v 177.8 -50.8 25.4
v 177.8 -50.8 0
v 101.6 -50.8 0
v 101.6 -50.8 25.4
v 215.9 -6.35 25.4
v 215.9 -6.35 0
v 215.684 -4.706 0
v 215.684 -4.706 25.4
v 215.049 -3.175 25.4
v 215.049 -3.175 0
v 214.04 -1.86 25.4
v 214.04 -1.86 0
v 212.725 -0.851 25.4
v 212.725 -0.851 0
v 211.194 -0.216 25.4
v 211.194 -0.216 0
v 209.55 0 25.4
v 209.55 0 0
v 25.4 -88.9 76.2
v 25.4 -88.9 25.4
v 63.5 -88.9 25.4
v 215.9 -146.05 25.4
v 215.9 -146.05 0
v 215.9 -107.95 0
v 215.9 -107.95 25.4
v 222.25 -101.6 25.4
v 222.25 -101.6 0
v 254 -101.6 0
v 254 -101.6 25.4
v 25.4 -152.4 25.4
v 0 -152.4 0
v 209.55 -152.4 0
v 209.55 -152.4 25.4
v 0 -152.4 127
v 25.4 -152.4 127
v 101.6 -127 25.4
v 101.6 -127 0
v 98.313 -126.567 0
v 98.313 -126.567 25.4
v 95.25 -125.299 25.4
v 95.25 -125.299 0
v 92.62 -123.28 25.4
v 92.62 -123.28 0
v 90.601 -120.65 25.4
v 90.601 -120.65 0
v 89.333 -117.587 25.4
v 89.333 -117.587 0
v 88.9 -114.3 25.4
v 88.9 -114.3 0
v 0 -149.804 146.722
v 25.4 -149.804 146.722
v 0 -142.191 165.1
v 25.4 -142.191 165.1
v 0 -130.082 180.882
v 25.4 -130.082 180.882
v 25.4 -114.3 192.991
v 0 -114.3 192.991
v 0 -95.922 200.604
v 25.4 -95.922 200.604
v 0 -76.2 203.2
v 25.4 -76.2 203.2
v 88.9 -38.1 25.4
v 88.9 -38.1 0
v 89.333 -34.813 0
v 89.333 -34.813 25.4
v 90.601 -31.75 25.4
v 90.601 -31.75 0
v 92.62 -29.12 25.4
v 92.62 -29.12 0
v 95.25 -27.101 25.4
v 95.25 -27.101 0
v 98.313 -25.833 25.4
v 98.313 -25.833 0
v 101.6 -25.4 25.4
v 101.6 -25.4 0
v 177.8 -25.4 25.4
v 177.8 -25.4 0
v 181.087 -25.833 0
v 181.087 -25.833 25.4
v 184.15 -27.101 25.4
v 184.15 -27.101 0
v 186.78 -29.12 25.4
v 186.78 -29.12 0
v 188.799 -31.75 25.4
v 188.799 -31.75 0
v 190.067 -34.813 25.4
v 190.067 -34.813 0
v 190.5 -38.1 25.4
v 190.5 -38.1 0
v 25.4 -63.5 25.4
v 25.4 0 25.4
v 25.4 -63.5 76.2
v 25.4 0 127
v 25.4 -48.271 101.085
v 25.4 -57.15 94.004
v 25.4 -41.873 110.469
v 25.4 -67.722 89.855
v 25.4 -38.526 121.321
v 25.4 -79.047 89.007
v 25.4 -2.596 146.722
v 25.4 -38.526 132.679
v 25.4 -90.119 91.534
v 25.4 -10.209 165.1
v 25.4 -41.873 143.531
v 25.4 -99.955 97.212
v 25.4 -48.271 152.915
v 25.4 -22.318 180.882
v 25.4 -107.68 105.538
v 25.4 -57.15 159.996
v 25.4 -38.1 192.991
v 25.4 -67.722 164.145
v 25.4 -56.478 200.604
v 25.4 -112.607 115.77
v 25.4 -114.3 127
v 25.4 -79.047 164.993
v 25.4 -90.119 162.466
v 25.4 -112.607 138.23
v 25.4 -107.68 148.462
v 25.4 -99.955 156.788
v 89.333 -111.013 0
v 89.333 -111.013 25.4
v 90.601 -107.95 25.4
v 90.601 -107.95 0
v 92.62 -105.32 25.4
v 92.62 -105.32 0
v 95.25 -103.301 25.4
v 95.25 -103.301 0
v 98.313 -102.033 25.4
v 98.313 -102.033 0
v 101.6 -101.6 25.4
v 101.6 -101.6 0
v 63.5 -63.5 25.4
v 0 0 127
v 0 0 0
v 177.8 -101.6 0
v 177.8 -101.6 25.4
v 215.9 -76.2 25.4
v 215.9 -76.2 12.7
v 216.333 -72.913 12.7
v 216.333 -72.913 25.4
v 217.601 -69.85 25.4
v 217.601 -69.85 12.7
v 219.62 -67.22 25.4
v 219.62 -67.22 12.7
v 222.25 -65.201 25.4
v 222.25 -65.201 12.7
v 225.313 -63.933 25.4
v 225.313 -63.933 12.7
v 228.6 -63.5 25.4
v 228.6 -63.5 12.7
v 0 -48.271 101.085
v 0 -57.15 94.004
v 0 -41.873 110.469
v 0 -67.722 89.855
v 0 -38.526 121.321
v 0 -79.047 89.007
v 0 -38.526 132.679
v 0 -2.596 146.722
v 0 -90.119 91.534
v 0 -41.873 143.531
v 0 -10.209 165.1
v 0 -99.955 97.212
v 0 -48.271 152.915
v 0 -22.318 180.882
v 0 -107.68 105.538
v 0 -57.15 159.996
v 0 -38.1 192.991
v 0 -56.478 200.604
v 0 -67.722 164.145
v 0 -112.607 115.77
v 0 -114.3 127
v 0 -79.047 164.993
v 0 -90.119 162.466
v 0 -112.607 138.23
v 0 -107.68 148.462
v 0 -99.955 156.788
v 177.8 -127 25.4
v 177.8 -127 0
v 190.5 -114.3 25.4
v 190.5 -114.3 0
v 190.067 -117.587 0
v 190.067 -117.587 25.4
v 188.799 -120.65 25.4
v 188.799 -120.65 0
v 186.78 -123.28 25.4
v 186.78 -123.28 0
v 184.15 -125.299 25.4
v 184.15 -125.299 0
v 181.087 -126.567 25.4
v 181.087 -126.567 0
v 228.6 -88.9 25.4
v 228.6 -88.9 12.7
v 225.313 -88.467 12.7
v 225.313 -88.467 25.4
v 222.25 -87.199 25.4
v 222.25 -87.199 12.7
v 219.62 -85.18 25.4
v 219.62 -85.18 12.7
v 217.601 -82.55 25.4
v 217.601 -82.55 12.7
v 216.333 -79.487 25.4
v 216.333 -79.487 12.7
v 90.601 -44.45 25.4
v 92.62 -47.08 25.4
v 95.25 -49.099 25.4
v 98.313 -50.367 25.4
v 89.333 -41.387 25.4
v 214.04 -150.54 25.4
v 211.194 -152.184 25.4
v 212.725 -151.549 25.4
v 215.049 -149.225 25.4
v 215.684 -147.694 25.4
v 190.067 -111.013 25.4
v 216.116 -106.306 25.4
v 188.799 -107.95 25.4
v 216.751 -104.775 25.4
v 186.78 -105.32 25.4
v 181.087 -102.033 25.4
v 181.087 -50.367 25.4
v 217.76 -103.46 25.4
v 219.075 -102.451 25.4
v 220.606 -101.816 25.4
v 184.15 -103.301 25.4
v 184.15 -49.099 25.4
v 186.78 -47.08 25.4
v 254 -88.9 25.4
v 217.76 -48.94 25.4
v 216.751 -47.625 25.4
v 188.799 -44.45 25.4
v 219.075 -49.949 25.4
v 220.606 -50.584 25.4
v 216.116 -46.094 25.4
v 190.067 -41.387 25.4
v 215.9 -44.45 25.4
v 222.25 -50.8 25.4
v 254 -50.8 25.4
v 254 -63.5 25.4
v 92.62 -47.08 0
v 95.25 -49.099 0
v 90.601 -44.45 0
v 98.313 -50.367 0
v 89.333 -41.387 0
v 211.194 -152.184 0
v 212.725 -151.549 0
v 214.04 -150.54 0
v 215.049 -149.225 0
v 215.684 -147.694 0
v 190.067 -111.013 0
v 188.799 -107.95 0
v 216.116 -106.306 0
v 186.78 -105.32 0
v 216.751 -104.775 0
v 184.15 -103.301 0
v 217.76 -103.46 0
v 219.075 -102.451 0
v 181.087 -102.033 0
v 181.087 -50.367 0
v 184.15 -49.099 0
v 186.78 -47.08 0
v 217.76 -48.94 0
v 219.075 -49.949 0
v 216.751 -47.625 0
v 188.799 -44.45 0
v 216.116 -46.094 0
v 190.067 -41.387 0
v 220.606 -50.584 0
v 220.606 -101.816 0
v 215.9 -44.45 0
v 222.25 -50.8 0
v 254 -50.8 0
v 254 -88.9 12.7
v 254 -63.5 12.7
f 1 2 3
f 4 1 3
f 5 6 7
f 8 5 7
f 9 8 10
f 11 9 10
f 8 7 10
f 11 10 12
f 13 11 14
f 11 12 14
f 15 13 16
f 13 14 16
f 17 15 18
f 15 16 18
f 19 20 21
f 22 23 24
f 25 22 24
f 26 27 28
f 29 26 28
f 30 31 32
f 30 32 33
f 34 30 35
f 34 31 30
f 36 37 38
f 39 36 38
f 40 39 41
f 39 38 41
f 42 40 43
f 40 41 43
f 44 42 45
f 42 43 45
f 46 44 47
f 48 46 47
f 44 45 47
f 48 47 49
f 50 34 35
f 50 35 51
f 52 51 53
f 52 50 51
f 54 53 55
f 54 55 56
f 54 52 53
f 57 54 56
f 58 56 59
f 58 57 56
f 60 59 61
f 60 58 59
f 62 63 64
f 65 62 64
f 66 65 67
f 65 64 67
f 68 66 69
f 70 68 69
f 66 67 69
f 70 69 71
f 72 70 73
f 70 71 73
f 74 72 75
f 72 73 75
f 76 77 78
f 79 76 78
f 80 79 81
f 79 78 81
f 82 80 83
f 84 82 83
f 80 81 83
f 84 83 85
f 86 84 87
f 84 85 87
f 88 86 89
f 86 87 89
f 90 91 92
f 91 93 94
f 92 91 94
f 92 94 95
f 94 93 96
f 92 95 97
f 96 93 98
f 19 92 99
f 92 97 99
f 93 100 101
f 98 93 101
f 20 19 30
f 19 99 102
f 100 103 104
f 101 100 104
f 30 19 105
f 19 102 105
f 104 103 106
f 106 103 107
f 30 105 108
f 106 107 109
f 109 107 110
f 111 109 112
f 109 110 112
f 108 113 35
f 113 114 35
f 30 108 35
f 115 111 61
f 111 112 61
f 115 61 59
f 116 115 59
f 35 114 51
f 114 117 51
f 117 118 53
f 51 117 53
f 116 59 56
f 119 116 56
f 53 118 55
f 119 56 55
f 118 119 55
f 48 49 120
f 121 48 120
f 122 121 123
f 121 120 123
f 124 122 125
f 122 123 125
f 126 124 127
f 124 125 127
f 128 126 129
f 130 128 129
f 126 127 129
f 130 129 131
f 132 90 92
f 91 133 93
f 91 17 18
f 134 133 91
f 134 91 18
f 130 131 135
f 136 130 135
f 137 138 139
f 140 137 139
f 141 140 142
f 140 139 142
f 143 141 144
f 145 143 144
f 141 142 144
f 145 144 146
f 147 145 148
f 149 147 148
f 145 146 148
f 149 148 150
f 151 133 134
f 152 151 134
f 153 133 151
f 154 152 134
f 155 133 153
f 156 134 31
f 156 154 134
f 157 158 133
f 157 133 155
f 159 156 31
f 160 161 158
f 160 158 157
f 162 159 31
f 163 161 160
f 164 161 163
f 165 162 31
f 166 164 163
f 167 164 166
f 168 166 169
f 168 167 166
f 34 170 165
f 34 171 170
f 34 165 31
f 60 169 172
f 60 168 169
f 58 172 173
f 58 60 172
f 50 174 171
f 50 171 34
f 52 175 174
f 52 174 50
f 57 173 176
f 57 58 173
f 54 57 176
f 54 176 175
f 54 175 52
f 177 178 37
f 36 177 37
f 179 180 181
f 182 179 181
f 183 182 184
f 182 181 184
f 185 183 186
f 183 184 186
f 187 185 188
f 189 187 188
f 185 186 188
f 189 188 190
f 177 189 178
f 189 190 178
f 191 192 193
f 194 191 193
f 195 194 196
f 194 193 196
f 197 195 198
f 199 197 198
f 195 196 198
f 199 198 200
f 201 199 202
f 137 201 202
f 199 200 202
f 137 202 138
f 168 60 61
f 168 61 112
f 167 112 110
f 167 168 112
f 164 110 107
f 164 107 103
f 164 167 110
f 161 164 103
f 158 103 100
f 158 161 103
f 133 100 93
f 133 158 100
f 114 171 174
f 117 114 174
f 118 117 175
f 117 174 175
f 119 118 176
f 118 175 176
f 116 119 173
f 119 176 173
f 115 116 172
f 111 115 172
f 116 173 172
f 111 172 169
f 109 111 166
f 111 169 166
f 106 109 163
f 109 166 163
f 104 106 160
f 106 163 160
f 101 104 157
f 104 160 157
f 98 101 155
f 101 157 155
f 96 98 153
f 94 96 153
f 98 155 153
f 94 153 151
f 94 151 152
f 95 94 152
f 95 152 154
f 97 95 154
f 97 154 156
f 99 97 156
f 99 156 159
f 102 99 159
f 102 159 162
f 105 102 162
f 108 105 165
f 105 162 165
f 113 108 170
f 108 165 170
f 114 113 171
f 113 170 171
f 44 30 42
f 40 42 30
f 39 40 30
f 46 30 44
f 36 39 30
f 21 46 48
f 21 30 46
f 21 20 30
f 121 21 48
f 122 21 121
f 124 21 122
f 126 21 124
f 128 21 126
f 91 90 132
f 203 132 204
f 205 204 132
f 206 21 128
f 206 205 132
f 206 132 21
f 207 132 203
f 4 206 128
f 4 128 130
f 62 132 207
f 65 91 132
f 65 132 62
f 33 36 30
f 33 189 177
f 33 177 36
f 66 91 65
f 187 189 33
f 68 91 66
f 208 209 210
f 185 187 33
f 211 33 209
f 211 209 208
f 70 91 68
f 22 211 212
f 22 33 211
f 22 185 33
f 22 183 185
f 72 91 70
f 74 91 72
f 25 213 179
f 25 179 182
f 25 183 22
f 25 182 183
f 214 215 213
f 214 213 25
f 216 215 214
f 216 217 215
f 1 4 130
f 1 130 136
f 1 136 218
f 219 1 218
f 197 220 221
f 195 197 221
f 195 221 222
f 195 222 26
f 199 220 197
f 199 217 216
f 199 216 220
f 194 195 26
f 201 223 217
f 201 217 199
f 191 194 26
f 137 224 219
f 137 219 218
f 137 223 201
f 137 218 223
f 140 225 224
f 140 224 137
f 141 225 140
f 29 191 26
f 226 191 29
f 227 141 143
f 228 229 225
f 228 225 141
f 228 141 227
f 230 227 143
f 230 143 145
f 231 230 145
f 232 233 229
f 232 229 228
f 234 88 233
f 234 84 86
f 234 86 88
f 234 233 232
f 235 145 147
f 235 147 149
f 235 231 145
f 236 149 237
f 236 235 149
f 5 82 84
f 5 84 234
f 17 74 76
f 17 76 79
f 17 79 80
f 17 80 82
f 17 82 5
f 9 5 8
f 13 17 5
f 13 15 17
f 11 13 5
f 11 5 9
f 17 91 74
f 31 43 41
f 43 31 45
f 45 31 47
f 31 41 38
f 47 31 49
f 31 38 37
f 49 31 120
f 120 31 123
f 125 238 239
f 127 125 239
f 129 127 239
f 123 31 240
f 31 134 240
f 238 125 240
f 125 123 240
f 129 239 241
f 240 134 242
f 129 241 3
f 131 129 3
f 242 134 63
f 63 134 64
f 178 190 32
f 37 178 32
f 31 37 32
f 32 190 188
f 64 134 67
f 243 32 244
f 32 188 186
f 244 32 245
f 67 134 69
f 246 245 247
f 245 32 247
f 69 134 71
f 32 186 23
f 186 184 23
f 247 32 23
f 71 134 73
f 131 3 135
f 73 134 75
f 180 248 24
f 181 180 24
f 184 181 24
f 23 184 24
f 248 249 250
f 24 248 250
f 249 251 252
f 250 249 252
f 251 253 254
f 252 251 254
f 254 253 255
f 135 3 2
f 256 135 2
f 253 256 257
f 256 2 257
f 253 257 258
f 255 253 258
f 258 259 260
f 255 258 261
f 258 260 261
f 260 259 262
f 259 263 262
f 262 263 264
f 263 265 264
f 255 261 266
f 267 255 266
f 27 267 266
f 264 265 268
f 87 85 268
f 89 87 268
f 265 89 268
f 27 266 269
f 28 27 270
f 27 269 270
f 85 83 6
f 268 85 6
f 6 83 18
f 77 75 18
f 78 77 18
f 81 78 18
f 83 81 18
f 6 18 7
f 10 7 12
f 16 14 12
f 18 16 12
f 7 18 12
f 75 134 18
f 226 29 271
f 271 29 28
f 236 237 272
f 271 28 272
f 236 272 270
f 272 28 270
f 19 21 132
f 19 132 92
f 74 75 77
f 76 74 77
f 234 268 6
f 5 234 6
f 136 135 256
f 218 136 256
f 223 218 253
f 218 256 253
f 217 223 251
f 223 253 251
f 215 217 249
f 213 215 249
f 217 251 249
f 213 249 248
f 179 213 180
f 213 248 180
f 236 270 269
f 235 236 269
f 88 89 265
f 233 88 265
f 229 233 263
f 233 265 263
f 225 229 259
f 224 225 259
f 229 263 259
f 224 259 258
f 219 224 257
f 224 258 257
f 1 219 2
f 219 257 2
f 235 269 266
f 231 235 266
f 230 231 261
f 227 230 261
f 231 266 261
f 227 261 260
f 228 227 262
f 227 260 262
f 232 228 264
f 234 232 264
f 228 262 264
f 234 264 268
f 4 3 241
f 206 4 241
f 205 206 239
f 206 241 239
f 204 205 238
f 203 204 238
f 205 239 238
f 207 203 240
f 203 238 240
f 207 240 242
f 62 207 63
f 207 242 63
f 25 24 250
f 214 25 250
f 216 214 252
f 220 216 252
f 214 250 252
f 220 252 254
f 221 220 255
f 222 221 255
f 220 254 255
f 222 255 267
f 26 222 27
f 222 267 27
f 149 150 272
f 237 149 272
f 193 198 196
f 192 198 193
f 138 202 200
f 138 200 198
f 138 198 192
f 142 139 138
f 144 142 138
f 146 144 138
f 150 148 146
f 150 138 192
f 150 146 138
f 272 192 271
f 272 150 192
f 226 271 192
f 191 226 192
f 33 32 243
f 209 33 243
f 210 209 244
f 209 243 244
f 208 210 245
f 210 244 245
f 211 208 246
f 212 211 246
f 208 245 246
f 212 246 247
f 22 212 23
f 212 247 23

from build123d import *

# Parameters (mm, degrees)
F1_DEPTH = 25.4
F2_DEPTH = 12.7
F3_R     = 38.1
F4_DEPTH = 25.4
F6_START = -63.5
F6_DEPTH = 25.4


with BuildPart() as f1:
    # F0 (on Top) → F1 (new body)
    with BuildSketch(Plane.XY):
        with BuildLine():
            Line((88.9, -38.1), (0, -38.1))
            Line((0, -38.1), (0, -114.3))
            Line((0, -114.3), (88.9, -114.3))
            ThreePointArc((88.9, -114.3), (92.6197438789, -105.3197438789), (101.6, -101.6))
            Line((101.6, -101.6), (177.8, -101.6))
            ThreePointArc((177.8, -101.6), (186.7802561211, -105.3197438789), (190.5, -114.3))
            Line((190.5, -114.3), (215.9, -114.3))
            Line((215.9, -114.3), (215.9, -107.95))
            ThreePointArc((215.9, -107.95), (217.7598719395, -103.4598719395), (222.25, -101.6))
            Line((222.25, -101.6), (254, -101.6))
            Line((254, -101.6), (254, -88.9))
            Line((254, -88.9), (228.6, -88.9))
            ThreePointArc((228.6, -88.9), (219.6197438789, -85.1802561211), (215.9, -76.2))
            ThreePointArc((215.9, -76.2), (219.6197438789, -67.2197438789), (228.6, -63.5))
            Line((228.6, -63.5), (254, -63.5))
            Line((254, -63.5), (254, -50.8))
            Line((254, -50.8), (222.25, -50.8))
            ThreePointArc((222.25, -50.8), (217.7598719395, -48.9401280605), (215.9, -44.45))
            Line((215.9, -44.45), (215.9, -38.1))
            Line((215.9, -38.1), (190.5, -38.1))
            ThreePointArc((190.5, -38.1), (186.7802561211, -47.0802561211), (177.8, -50.8))
            Line((177.8, -50.8), (101.6, -50.8))
            ThreePointArc((101.6, -50.8), (92.6197438789, -47.0802561211), (88.9, -38.1))
        make_face()
        with BuildLine():
            Line((209.55, 0), (0, 0))
            Line((0, 0), (0, -38.1))
            Line((0, -38.1), (88.9, -38.1))
            ThreePointArc((88.9, -38.1), (92.6197438789, -29.1197438789), (101.6, -25.4))
            Line((101.6, -25.4), (177.8, -25.4))
            ThreePointArc((177.8, -25.4), (186.7802561211, -29.1197438789), (190.5, -38.1))
            Line((190.5, -38.1), (215.9, -38.1))
            Line((215.9, -38.1), (215.9, -6.35))
            ThreePointArc((215.9, -6.35), (214.0401280605, -1.8598719395), (209.55, 0))
        make_face()
        with BuildLine():
            Line((88.9, -114.3), (0, -114.3))
            Line((0, -114.3), (0, -152.4))
            Line((0, -152.4), (209.55, -152.4))
            ThreePointArc((209.55, -152.4), (214.0401280605, -150.5401280605), (215.9, -146.05))
            Line((215.9, -146.05), (215.9, -114.3))
            Line((215.9, -114.3), (190.5, -114.3))
            ThreePointArc((190.5, -114.3), (186.7802561211, -123.2802561211), (177.8, -127))
            Line((177.8, -127), (101.6, -127))
            ThreePointArc((101.6, -127), (92.6197438789, -123.2802561211), (88.9, -114.3))
        make_face()
    extrude(amount=F1_DEPTH)

    # F0 (on Top) → F2 (join)
    with BuildSketch(Plane.XY):
        with BuildLine():
            Line((254, -88.9), (254, -63.5))
            Line((254, -63.5), (228.6, -63.5))
            ThreePointArc((228.6, -63.5), (219.6197438789, -67.2197438789), (215.9, -76.2))
            ThreePointArc((215.9, -76.2), (219.6197438789, -85.1802561211), (228.6, -88.9))
            Line((228.6, -88.9), (254, -88.9))
        make_face()
    extrude(amount=F2_DEPTH)

    # F3 (on face) → F4 (join)
    with BuildSketch(Plane(origin=(0, 0, 0), x_dir=(0, -1, 0), z_dir=(-1, 0, 0))):
        with BuildLine():
            Line((0, 127), (0, 25.4))
            Line((0, 25.4), (152.4, 25.4))
            Line((152.4, 25.4), (152.4, 127))
            ThreePointArc((152.4, 127), (130.0815367264, 180.8815367264), (76.2, 203.2))
            ThreePointArc((76.2, 203.2), (22.3184632736, 180.8815367264), (0, 127))
        make_face()
        with Locations((76.2, 127)):
            Circle(F3_R, mode=Mode.SUBTRACT)
    extrude(amount=-F4_DEPTH)

    # F5 (on face) → F6 (join)
    with BuildSketch(Plane.XZ.offset(152.4).offset(F6_START)):
        Polygon((25.4, 76.2), (25.4, 25.4), (63.5, 25.4), align=None)
    extrude(amount=-F6_DEPTH)


solid = f1.part
